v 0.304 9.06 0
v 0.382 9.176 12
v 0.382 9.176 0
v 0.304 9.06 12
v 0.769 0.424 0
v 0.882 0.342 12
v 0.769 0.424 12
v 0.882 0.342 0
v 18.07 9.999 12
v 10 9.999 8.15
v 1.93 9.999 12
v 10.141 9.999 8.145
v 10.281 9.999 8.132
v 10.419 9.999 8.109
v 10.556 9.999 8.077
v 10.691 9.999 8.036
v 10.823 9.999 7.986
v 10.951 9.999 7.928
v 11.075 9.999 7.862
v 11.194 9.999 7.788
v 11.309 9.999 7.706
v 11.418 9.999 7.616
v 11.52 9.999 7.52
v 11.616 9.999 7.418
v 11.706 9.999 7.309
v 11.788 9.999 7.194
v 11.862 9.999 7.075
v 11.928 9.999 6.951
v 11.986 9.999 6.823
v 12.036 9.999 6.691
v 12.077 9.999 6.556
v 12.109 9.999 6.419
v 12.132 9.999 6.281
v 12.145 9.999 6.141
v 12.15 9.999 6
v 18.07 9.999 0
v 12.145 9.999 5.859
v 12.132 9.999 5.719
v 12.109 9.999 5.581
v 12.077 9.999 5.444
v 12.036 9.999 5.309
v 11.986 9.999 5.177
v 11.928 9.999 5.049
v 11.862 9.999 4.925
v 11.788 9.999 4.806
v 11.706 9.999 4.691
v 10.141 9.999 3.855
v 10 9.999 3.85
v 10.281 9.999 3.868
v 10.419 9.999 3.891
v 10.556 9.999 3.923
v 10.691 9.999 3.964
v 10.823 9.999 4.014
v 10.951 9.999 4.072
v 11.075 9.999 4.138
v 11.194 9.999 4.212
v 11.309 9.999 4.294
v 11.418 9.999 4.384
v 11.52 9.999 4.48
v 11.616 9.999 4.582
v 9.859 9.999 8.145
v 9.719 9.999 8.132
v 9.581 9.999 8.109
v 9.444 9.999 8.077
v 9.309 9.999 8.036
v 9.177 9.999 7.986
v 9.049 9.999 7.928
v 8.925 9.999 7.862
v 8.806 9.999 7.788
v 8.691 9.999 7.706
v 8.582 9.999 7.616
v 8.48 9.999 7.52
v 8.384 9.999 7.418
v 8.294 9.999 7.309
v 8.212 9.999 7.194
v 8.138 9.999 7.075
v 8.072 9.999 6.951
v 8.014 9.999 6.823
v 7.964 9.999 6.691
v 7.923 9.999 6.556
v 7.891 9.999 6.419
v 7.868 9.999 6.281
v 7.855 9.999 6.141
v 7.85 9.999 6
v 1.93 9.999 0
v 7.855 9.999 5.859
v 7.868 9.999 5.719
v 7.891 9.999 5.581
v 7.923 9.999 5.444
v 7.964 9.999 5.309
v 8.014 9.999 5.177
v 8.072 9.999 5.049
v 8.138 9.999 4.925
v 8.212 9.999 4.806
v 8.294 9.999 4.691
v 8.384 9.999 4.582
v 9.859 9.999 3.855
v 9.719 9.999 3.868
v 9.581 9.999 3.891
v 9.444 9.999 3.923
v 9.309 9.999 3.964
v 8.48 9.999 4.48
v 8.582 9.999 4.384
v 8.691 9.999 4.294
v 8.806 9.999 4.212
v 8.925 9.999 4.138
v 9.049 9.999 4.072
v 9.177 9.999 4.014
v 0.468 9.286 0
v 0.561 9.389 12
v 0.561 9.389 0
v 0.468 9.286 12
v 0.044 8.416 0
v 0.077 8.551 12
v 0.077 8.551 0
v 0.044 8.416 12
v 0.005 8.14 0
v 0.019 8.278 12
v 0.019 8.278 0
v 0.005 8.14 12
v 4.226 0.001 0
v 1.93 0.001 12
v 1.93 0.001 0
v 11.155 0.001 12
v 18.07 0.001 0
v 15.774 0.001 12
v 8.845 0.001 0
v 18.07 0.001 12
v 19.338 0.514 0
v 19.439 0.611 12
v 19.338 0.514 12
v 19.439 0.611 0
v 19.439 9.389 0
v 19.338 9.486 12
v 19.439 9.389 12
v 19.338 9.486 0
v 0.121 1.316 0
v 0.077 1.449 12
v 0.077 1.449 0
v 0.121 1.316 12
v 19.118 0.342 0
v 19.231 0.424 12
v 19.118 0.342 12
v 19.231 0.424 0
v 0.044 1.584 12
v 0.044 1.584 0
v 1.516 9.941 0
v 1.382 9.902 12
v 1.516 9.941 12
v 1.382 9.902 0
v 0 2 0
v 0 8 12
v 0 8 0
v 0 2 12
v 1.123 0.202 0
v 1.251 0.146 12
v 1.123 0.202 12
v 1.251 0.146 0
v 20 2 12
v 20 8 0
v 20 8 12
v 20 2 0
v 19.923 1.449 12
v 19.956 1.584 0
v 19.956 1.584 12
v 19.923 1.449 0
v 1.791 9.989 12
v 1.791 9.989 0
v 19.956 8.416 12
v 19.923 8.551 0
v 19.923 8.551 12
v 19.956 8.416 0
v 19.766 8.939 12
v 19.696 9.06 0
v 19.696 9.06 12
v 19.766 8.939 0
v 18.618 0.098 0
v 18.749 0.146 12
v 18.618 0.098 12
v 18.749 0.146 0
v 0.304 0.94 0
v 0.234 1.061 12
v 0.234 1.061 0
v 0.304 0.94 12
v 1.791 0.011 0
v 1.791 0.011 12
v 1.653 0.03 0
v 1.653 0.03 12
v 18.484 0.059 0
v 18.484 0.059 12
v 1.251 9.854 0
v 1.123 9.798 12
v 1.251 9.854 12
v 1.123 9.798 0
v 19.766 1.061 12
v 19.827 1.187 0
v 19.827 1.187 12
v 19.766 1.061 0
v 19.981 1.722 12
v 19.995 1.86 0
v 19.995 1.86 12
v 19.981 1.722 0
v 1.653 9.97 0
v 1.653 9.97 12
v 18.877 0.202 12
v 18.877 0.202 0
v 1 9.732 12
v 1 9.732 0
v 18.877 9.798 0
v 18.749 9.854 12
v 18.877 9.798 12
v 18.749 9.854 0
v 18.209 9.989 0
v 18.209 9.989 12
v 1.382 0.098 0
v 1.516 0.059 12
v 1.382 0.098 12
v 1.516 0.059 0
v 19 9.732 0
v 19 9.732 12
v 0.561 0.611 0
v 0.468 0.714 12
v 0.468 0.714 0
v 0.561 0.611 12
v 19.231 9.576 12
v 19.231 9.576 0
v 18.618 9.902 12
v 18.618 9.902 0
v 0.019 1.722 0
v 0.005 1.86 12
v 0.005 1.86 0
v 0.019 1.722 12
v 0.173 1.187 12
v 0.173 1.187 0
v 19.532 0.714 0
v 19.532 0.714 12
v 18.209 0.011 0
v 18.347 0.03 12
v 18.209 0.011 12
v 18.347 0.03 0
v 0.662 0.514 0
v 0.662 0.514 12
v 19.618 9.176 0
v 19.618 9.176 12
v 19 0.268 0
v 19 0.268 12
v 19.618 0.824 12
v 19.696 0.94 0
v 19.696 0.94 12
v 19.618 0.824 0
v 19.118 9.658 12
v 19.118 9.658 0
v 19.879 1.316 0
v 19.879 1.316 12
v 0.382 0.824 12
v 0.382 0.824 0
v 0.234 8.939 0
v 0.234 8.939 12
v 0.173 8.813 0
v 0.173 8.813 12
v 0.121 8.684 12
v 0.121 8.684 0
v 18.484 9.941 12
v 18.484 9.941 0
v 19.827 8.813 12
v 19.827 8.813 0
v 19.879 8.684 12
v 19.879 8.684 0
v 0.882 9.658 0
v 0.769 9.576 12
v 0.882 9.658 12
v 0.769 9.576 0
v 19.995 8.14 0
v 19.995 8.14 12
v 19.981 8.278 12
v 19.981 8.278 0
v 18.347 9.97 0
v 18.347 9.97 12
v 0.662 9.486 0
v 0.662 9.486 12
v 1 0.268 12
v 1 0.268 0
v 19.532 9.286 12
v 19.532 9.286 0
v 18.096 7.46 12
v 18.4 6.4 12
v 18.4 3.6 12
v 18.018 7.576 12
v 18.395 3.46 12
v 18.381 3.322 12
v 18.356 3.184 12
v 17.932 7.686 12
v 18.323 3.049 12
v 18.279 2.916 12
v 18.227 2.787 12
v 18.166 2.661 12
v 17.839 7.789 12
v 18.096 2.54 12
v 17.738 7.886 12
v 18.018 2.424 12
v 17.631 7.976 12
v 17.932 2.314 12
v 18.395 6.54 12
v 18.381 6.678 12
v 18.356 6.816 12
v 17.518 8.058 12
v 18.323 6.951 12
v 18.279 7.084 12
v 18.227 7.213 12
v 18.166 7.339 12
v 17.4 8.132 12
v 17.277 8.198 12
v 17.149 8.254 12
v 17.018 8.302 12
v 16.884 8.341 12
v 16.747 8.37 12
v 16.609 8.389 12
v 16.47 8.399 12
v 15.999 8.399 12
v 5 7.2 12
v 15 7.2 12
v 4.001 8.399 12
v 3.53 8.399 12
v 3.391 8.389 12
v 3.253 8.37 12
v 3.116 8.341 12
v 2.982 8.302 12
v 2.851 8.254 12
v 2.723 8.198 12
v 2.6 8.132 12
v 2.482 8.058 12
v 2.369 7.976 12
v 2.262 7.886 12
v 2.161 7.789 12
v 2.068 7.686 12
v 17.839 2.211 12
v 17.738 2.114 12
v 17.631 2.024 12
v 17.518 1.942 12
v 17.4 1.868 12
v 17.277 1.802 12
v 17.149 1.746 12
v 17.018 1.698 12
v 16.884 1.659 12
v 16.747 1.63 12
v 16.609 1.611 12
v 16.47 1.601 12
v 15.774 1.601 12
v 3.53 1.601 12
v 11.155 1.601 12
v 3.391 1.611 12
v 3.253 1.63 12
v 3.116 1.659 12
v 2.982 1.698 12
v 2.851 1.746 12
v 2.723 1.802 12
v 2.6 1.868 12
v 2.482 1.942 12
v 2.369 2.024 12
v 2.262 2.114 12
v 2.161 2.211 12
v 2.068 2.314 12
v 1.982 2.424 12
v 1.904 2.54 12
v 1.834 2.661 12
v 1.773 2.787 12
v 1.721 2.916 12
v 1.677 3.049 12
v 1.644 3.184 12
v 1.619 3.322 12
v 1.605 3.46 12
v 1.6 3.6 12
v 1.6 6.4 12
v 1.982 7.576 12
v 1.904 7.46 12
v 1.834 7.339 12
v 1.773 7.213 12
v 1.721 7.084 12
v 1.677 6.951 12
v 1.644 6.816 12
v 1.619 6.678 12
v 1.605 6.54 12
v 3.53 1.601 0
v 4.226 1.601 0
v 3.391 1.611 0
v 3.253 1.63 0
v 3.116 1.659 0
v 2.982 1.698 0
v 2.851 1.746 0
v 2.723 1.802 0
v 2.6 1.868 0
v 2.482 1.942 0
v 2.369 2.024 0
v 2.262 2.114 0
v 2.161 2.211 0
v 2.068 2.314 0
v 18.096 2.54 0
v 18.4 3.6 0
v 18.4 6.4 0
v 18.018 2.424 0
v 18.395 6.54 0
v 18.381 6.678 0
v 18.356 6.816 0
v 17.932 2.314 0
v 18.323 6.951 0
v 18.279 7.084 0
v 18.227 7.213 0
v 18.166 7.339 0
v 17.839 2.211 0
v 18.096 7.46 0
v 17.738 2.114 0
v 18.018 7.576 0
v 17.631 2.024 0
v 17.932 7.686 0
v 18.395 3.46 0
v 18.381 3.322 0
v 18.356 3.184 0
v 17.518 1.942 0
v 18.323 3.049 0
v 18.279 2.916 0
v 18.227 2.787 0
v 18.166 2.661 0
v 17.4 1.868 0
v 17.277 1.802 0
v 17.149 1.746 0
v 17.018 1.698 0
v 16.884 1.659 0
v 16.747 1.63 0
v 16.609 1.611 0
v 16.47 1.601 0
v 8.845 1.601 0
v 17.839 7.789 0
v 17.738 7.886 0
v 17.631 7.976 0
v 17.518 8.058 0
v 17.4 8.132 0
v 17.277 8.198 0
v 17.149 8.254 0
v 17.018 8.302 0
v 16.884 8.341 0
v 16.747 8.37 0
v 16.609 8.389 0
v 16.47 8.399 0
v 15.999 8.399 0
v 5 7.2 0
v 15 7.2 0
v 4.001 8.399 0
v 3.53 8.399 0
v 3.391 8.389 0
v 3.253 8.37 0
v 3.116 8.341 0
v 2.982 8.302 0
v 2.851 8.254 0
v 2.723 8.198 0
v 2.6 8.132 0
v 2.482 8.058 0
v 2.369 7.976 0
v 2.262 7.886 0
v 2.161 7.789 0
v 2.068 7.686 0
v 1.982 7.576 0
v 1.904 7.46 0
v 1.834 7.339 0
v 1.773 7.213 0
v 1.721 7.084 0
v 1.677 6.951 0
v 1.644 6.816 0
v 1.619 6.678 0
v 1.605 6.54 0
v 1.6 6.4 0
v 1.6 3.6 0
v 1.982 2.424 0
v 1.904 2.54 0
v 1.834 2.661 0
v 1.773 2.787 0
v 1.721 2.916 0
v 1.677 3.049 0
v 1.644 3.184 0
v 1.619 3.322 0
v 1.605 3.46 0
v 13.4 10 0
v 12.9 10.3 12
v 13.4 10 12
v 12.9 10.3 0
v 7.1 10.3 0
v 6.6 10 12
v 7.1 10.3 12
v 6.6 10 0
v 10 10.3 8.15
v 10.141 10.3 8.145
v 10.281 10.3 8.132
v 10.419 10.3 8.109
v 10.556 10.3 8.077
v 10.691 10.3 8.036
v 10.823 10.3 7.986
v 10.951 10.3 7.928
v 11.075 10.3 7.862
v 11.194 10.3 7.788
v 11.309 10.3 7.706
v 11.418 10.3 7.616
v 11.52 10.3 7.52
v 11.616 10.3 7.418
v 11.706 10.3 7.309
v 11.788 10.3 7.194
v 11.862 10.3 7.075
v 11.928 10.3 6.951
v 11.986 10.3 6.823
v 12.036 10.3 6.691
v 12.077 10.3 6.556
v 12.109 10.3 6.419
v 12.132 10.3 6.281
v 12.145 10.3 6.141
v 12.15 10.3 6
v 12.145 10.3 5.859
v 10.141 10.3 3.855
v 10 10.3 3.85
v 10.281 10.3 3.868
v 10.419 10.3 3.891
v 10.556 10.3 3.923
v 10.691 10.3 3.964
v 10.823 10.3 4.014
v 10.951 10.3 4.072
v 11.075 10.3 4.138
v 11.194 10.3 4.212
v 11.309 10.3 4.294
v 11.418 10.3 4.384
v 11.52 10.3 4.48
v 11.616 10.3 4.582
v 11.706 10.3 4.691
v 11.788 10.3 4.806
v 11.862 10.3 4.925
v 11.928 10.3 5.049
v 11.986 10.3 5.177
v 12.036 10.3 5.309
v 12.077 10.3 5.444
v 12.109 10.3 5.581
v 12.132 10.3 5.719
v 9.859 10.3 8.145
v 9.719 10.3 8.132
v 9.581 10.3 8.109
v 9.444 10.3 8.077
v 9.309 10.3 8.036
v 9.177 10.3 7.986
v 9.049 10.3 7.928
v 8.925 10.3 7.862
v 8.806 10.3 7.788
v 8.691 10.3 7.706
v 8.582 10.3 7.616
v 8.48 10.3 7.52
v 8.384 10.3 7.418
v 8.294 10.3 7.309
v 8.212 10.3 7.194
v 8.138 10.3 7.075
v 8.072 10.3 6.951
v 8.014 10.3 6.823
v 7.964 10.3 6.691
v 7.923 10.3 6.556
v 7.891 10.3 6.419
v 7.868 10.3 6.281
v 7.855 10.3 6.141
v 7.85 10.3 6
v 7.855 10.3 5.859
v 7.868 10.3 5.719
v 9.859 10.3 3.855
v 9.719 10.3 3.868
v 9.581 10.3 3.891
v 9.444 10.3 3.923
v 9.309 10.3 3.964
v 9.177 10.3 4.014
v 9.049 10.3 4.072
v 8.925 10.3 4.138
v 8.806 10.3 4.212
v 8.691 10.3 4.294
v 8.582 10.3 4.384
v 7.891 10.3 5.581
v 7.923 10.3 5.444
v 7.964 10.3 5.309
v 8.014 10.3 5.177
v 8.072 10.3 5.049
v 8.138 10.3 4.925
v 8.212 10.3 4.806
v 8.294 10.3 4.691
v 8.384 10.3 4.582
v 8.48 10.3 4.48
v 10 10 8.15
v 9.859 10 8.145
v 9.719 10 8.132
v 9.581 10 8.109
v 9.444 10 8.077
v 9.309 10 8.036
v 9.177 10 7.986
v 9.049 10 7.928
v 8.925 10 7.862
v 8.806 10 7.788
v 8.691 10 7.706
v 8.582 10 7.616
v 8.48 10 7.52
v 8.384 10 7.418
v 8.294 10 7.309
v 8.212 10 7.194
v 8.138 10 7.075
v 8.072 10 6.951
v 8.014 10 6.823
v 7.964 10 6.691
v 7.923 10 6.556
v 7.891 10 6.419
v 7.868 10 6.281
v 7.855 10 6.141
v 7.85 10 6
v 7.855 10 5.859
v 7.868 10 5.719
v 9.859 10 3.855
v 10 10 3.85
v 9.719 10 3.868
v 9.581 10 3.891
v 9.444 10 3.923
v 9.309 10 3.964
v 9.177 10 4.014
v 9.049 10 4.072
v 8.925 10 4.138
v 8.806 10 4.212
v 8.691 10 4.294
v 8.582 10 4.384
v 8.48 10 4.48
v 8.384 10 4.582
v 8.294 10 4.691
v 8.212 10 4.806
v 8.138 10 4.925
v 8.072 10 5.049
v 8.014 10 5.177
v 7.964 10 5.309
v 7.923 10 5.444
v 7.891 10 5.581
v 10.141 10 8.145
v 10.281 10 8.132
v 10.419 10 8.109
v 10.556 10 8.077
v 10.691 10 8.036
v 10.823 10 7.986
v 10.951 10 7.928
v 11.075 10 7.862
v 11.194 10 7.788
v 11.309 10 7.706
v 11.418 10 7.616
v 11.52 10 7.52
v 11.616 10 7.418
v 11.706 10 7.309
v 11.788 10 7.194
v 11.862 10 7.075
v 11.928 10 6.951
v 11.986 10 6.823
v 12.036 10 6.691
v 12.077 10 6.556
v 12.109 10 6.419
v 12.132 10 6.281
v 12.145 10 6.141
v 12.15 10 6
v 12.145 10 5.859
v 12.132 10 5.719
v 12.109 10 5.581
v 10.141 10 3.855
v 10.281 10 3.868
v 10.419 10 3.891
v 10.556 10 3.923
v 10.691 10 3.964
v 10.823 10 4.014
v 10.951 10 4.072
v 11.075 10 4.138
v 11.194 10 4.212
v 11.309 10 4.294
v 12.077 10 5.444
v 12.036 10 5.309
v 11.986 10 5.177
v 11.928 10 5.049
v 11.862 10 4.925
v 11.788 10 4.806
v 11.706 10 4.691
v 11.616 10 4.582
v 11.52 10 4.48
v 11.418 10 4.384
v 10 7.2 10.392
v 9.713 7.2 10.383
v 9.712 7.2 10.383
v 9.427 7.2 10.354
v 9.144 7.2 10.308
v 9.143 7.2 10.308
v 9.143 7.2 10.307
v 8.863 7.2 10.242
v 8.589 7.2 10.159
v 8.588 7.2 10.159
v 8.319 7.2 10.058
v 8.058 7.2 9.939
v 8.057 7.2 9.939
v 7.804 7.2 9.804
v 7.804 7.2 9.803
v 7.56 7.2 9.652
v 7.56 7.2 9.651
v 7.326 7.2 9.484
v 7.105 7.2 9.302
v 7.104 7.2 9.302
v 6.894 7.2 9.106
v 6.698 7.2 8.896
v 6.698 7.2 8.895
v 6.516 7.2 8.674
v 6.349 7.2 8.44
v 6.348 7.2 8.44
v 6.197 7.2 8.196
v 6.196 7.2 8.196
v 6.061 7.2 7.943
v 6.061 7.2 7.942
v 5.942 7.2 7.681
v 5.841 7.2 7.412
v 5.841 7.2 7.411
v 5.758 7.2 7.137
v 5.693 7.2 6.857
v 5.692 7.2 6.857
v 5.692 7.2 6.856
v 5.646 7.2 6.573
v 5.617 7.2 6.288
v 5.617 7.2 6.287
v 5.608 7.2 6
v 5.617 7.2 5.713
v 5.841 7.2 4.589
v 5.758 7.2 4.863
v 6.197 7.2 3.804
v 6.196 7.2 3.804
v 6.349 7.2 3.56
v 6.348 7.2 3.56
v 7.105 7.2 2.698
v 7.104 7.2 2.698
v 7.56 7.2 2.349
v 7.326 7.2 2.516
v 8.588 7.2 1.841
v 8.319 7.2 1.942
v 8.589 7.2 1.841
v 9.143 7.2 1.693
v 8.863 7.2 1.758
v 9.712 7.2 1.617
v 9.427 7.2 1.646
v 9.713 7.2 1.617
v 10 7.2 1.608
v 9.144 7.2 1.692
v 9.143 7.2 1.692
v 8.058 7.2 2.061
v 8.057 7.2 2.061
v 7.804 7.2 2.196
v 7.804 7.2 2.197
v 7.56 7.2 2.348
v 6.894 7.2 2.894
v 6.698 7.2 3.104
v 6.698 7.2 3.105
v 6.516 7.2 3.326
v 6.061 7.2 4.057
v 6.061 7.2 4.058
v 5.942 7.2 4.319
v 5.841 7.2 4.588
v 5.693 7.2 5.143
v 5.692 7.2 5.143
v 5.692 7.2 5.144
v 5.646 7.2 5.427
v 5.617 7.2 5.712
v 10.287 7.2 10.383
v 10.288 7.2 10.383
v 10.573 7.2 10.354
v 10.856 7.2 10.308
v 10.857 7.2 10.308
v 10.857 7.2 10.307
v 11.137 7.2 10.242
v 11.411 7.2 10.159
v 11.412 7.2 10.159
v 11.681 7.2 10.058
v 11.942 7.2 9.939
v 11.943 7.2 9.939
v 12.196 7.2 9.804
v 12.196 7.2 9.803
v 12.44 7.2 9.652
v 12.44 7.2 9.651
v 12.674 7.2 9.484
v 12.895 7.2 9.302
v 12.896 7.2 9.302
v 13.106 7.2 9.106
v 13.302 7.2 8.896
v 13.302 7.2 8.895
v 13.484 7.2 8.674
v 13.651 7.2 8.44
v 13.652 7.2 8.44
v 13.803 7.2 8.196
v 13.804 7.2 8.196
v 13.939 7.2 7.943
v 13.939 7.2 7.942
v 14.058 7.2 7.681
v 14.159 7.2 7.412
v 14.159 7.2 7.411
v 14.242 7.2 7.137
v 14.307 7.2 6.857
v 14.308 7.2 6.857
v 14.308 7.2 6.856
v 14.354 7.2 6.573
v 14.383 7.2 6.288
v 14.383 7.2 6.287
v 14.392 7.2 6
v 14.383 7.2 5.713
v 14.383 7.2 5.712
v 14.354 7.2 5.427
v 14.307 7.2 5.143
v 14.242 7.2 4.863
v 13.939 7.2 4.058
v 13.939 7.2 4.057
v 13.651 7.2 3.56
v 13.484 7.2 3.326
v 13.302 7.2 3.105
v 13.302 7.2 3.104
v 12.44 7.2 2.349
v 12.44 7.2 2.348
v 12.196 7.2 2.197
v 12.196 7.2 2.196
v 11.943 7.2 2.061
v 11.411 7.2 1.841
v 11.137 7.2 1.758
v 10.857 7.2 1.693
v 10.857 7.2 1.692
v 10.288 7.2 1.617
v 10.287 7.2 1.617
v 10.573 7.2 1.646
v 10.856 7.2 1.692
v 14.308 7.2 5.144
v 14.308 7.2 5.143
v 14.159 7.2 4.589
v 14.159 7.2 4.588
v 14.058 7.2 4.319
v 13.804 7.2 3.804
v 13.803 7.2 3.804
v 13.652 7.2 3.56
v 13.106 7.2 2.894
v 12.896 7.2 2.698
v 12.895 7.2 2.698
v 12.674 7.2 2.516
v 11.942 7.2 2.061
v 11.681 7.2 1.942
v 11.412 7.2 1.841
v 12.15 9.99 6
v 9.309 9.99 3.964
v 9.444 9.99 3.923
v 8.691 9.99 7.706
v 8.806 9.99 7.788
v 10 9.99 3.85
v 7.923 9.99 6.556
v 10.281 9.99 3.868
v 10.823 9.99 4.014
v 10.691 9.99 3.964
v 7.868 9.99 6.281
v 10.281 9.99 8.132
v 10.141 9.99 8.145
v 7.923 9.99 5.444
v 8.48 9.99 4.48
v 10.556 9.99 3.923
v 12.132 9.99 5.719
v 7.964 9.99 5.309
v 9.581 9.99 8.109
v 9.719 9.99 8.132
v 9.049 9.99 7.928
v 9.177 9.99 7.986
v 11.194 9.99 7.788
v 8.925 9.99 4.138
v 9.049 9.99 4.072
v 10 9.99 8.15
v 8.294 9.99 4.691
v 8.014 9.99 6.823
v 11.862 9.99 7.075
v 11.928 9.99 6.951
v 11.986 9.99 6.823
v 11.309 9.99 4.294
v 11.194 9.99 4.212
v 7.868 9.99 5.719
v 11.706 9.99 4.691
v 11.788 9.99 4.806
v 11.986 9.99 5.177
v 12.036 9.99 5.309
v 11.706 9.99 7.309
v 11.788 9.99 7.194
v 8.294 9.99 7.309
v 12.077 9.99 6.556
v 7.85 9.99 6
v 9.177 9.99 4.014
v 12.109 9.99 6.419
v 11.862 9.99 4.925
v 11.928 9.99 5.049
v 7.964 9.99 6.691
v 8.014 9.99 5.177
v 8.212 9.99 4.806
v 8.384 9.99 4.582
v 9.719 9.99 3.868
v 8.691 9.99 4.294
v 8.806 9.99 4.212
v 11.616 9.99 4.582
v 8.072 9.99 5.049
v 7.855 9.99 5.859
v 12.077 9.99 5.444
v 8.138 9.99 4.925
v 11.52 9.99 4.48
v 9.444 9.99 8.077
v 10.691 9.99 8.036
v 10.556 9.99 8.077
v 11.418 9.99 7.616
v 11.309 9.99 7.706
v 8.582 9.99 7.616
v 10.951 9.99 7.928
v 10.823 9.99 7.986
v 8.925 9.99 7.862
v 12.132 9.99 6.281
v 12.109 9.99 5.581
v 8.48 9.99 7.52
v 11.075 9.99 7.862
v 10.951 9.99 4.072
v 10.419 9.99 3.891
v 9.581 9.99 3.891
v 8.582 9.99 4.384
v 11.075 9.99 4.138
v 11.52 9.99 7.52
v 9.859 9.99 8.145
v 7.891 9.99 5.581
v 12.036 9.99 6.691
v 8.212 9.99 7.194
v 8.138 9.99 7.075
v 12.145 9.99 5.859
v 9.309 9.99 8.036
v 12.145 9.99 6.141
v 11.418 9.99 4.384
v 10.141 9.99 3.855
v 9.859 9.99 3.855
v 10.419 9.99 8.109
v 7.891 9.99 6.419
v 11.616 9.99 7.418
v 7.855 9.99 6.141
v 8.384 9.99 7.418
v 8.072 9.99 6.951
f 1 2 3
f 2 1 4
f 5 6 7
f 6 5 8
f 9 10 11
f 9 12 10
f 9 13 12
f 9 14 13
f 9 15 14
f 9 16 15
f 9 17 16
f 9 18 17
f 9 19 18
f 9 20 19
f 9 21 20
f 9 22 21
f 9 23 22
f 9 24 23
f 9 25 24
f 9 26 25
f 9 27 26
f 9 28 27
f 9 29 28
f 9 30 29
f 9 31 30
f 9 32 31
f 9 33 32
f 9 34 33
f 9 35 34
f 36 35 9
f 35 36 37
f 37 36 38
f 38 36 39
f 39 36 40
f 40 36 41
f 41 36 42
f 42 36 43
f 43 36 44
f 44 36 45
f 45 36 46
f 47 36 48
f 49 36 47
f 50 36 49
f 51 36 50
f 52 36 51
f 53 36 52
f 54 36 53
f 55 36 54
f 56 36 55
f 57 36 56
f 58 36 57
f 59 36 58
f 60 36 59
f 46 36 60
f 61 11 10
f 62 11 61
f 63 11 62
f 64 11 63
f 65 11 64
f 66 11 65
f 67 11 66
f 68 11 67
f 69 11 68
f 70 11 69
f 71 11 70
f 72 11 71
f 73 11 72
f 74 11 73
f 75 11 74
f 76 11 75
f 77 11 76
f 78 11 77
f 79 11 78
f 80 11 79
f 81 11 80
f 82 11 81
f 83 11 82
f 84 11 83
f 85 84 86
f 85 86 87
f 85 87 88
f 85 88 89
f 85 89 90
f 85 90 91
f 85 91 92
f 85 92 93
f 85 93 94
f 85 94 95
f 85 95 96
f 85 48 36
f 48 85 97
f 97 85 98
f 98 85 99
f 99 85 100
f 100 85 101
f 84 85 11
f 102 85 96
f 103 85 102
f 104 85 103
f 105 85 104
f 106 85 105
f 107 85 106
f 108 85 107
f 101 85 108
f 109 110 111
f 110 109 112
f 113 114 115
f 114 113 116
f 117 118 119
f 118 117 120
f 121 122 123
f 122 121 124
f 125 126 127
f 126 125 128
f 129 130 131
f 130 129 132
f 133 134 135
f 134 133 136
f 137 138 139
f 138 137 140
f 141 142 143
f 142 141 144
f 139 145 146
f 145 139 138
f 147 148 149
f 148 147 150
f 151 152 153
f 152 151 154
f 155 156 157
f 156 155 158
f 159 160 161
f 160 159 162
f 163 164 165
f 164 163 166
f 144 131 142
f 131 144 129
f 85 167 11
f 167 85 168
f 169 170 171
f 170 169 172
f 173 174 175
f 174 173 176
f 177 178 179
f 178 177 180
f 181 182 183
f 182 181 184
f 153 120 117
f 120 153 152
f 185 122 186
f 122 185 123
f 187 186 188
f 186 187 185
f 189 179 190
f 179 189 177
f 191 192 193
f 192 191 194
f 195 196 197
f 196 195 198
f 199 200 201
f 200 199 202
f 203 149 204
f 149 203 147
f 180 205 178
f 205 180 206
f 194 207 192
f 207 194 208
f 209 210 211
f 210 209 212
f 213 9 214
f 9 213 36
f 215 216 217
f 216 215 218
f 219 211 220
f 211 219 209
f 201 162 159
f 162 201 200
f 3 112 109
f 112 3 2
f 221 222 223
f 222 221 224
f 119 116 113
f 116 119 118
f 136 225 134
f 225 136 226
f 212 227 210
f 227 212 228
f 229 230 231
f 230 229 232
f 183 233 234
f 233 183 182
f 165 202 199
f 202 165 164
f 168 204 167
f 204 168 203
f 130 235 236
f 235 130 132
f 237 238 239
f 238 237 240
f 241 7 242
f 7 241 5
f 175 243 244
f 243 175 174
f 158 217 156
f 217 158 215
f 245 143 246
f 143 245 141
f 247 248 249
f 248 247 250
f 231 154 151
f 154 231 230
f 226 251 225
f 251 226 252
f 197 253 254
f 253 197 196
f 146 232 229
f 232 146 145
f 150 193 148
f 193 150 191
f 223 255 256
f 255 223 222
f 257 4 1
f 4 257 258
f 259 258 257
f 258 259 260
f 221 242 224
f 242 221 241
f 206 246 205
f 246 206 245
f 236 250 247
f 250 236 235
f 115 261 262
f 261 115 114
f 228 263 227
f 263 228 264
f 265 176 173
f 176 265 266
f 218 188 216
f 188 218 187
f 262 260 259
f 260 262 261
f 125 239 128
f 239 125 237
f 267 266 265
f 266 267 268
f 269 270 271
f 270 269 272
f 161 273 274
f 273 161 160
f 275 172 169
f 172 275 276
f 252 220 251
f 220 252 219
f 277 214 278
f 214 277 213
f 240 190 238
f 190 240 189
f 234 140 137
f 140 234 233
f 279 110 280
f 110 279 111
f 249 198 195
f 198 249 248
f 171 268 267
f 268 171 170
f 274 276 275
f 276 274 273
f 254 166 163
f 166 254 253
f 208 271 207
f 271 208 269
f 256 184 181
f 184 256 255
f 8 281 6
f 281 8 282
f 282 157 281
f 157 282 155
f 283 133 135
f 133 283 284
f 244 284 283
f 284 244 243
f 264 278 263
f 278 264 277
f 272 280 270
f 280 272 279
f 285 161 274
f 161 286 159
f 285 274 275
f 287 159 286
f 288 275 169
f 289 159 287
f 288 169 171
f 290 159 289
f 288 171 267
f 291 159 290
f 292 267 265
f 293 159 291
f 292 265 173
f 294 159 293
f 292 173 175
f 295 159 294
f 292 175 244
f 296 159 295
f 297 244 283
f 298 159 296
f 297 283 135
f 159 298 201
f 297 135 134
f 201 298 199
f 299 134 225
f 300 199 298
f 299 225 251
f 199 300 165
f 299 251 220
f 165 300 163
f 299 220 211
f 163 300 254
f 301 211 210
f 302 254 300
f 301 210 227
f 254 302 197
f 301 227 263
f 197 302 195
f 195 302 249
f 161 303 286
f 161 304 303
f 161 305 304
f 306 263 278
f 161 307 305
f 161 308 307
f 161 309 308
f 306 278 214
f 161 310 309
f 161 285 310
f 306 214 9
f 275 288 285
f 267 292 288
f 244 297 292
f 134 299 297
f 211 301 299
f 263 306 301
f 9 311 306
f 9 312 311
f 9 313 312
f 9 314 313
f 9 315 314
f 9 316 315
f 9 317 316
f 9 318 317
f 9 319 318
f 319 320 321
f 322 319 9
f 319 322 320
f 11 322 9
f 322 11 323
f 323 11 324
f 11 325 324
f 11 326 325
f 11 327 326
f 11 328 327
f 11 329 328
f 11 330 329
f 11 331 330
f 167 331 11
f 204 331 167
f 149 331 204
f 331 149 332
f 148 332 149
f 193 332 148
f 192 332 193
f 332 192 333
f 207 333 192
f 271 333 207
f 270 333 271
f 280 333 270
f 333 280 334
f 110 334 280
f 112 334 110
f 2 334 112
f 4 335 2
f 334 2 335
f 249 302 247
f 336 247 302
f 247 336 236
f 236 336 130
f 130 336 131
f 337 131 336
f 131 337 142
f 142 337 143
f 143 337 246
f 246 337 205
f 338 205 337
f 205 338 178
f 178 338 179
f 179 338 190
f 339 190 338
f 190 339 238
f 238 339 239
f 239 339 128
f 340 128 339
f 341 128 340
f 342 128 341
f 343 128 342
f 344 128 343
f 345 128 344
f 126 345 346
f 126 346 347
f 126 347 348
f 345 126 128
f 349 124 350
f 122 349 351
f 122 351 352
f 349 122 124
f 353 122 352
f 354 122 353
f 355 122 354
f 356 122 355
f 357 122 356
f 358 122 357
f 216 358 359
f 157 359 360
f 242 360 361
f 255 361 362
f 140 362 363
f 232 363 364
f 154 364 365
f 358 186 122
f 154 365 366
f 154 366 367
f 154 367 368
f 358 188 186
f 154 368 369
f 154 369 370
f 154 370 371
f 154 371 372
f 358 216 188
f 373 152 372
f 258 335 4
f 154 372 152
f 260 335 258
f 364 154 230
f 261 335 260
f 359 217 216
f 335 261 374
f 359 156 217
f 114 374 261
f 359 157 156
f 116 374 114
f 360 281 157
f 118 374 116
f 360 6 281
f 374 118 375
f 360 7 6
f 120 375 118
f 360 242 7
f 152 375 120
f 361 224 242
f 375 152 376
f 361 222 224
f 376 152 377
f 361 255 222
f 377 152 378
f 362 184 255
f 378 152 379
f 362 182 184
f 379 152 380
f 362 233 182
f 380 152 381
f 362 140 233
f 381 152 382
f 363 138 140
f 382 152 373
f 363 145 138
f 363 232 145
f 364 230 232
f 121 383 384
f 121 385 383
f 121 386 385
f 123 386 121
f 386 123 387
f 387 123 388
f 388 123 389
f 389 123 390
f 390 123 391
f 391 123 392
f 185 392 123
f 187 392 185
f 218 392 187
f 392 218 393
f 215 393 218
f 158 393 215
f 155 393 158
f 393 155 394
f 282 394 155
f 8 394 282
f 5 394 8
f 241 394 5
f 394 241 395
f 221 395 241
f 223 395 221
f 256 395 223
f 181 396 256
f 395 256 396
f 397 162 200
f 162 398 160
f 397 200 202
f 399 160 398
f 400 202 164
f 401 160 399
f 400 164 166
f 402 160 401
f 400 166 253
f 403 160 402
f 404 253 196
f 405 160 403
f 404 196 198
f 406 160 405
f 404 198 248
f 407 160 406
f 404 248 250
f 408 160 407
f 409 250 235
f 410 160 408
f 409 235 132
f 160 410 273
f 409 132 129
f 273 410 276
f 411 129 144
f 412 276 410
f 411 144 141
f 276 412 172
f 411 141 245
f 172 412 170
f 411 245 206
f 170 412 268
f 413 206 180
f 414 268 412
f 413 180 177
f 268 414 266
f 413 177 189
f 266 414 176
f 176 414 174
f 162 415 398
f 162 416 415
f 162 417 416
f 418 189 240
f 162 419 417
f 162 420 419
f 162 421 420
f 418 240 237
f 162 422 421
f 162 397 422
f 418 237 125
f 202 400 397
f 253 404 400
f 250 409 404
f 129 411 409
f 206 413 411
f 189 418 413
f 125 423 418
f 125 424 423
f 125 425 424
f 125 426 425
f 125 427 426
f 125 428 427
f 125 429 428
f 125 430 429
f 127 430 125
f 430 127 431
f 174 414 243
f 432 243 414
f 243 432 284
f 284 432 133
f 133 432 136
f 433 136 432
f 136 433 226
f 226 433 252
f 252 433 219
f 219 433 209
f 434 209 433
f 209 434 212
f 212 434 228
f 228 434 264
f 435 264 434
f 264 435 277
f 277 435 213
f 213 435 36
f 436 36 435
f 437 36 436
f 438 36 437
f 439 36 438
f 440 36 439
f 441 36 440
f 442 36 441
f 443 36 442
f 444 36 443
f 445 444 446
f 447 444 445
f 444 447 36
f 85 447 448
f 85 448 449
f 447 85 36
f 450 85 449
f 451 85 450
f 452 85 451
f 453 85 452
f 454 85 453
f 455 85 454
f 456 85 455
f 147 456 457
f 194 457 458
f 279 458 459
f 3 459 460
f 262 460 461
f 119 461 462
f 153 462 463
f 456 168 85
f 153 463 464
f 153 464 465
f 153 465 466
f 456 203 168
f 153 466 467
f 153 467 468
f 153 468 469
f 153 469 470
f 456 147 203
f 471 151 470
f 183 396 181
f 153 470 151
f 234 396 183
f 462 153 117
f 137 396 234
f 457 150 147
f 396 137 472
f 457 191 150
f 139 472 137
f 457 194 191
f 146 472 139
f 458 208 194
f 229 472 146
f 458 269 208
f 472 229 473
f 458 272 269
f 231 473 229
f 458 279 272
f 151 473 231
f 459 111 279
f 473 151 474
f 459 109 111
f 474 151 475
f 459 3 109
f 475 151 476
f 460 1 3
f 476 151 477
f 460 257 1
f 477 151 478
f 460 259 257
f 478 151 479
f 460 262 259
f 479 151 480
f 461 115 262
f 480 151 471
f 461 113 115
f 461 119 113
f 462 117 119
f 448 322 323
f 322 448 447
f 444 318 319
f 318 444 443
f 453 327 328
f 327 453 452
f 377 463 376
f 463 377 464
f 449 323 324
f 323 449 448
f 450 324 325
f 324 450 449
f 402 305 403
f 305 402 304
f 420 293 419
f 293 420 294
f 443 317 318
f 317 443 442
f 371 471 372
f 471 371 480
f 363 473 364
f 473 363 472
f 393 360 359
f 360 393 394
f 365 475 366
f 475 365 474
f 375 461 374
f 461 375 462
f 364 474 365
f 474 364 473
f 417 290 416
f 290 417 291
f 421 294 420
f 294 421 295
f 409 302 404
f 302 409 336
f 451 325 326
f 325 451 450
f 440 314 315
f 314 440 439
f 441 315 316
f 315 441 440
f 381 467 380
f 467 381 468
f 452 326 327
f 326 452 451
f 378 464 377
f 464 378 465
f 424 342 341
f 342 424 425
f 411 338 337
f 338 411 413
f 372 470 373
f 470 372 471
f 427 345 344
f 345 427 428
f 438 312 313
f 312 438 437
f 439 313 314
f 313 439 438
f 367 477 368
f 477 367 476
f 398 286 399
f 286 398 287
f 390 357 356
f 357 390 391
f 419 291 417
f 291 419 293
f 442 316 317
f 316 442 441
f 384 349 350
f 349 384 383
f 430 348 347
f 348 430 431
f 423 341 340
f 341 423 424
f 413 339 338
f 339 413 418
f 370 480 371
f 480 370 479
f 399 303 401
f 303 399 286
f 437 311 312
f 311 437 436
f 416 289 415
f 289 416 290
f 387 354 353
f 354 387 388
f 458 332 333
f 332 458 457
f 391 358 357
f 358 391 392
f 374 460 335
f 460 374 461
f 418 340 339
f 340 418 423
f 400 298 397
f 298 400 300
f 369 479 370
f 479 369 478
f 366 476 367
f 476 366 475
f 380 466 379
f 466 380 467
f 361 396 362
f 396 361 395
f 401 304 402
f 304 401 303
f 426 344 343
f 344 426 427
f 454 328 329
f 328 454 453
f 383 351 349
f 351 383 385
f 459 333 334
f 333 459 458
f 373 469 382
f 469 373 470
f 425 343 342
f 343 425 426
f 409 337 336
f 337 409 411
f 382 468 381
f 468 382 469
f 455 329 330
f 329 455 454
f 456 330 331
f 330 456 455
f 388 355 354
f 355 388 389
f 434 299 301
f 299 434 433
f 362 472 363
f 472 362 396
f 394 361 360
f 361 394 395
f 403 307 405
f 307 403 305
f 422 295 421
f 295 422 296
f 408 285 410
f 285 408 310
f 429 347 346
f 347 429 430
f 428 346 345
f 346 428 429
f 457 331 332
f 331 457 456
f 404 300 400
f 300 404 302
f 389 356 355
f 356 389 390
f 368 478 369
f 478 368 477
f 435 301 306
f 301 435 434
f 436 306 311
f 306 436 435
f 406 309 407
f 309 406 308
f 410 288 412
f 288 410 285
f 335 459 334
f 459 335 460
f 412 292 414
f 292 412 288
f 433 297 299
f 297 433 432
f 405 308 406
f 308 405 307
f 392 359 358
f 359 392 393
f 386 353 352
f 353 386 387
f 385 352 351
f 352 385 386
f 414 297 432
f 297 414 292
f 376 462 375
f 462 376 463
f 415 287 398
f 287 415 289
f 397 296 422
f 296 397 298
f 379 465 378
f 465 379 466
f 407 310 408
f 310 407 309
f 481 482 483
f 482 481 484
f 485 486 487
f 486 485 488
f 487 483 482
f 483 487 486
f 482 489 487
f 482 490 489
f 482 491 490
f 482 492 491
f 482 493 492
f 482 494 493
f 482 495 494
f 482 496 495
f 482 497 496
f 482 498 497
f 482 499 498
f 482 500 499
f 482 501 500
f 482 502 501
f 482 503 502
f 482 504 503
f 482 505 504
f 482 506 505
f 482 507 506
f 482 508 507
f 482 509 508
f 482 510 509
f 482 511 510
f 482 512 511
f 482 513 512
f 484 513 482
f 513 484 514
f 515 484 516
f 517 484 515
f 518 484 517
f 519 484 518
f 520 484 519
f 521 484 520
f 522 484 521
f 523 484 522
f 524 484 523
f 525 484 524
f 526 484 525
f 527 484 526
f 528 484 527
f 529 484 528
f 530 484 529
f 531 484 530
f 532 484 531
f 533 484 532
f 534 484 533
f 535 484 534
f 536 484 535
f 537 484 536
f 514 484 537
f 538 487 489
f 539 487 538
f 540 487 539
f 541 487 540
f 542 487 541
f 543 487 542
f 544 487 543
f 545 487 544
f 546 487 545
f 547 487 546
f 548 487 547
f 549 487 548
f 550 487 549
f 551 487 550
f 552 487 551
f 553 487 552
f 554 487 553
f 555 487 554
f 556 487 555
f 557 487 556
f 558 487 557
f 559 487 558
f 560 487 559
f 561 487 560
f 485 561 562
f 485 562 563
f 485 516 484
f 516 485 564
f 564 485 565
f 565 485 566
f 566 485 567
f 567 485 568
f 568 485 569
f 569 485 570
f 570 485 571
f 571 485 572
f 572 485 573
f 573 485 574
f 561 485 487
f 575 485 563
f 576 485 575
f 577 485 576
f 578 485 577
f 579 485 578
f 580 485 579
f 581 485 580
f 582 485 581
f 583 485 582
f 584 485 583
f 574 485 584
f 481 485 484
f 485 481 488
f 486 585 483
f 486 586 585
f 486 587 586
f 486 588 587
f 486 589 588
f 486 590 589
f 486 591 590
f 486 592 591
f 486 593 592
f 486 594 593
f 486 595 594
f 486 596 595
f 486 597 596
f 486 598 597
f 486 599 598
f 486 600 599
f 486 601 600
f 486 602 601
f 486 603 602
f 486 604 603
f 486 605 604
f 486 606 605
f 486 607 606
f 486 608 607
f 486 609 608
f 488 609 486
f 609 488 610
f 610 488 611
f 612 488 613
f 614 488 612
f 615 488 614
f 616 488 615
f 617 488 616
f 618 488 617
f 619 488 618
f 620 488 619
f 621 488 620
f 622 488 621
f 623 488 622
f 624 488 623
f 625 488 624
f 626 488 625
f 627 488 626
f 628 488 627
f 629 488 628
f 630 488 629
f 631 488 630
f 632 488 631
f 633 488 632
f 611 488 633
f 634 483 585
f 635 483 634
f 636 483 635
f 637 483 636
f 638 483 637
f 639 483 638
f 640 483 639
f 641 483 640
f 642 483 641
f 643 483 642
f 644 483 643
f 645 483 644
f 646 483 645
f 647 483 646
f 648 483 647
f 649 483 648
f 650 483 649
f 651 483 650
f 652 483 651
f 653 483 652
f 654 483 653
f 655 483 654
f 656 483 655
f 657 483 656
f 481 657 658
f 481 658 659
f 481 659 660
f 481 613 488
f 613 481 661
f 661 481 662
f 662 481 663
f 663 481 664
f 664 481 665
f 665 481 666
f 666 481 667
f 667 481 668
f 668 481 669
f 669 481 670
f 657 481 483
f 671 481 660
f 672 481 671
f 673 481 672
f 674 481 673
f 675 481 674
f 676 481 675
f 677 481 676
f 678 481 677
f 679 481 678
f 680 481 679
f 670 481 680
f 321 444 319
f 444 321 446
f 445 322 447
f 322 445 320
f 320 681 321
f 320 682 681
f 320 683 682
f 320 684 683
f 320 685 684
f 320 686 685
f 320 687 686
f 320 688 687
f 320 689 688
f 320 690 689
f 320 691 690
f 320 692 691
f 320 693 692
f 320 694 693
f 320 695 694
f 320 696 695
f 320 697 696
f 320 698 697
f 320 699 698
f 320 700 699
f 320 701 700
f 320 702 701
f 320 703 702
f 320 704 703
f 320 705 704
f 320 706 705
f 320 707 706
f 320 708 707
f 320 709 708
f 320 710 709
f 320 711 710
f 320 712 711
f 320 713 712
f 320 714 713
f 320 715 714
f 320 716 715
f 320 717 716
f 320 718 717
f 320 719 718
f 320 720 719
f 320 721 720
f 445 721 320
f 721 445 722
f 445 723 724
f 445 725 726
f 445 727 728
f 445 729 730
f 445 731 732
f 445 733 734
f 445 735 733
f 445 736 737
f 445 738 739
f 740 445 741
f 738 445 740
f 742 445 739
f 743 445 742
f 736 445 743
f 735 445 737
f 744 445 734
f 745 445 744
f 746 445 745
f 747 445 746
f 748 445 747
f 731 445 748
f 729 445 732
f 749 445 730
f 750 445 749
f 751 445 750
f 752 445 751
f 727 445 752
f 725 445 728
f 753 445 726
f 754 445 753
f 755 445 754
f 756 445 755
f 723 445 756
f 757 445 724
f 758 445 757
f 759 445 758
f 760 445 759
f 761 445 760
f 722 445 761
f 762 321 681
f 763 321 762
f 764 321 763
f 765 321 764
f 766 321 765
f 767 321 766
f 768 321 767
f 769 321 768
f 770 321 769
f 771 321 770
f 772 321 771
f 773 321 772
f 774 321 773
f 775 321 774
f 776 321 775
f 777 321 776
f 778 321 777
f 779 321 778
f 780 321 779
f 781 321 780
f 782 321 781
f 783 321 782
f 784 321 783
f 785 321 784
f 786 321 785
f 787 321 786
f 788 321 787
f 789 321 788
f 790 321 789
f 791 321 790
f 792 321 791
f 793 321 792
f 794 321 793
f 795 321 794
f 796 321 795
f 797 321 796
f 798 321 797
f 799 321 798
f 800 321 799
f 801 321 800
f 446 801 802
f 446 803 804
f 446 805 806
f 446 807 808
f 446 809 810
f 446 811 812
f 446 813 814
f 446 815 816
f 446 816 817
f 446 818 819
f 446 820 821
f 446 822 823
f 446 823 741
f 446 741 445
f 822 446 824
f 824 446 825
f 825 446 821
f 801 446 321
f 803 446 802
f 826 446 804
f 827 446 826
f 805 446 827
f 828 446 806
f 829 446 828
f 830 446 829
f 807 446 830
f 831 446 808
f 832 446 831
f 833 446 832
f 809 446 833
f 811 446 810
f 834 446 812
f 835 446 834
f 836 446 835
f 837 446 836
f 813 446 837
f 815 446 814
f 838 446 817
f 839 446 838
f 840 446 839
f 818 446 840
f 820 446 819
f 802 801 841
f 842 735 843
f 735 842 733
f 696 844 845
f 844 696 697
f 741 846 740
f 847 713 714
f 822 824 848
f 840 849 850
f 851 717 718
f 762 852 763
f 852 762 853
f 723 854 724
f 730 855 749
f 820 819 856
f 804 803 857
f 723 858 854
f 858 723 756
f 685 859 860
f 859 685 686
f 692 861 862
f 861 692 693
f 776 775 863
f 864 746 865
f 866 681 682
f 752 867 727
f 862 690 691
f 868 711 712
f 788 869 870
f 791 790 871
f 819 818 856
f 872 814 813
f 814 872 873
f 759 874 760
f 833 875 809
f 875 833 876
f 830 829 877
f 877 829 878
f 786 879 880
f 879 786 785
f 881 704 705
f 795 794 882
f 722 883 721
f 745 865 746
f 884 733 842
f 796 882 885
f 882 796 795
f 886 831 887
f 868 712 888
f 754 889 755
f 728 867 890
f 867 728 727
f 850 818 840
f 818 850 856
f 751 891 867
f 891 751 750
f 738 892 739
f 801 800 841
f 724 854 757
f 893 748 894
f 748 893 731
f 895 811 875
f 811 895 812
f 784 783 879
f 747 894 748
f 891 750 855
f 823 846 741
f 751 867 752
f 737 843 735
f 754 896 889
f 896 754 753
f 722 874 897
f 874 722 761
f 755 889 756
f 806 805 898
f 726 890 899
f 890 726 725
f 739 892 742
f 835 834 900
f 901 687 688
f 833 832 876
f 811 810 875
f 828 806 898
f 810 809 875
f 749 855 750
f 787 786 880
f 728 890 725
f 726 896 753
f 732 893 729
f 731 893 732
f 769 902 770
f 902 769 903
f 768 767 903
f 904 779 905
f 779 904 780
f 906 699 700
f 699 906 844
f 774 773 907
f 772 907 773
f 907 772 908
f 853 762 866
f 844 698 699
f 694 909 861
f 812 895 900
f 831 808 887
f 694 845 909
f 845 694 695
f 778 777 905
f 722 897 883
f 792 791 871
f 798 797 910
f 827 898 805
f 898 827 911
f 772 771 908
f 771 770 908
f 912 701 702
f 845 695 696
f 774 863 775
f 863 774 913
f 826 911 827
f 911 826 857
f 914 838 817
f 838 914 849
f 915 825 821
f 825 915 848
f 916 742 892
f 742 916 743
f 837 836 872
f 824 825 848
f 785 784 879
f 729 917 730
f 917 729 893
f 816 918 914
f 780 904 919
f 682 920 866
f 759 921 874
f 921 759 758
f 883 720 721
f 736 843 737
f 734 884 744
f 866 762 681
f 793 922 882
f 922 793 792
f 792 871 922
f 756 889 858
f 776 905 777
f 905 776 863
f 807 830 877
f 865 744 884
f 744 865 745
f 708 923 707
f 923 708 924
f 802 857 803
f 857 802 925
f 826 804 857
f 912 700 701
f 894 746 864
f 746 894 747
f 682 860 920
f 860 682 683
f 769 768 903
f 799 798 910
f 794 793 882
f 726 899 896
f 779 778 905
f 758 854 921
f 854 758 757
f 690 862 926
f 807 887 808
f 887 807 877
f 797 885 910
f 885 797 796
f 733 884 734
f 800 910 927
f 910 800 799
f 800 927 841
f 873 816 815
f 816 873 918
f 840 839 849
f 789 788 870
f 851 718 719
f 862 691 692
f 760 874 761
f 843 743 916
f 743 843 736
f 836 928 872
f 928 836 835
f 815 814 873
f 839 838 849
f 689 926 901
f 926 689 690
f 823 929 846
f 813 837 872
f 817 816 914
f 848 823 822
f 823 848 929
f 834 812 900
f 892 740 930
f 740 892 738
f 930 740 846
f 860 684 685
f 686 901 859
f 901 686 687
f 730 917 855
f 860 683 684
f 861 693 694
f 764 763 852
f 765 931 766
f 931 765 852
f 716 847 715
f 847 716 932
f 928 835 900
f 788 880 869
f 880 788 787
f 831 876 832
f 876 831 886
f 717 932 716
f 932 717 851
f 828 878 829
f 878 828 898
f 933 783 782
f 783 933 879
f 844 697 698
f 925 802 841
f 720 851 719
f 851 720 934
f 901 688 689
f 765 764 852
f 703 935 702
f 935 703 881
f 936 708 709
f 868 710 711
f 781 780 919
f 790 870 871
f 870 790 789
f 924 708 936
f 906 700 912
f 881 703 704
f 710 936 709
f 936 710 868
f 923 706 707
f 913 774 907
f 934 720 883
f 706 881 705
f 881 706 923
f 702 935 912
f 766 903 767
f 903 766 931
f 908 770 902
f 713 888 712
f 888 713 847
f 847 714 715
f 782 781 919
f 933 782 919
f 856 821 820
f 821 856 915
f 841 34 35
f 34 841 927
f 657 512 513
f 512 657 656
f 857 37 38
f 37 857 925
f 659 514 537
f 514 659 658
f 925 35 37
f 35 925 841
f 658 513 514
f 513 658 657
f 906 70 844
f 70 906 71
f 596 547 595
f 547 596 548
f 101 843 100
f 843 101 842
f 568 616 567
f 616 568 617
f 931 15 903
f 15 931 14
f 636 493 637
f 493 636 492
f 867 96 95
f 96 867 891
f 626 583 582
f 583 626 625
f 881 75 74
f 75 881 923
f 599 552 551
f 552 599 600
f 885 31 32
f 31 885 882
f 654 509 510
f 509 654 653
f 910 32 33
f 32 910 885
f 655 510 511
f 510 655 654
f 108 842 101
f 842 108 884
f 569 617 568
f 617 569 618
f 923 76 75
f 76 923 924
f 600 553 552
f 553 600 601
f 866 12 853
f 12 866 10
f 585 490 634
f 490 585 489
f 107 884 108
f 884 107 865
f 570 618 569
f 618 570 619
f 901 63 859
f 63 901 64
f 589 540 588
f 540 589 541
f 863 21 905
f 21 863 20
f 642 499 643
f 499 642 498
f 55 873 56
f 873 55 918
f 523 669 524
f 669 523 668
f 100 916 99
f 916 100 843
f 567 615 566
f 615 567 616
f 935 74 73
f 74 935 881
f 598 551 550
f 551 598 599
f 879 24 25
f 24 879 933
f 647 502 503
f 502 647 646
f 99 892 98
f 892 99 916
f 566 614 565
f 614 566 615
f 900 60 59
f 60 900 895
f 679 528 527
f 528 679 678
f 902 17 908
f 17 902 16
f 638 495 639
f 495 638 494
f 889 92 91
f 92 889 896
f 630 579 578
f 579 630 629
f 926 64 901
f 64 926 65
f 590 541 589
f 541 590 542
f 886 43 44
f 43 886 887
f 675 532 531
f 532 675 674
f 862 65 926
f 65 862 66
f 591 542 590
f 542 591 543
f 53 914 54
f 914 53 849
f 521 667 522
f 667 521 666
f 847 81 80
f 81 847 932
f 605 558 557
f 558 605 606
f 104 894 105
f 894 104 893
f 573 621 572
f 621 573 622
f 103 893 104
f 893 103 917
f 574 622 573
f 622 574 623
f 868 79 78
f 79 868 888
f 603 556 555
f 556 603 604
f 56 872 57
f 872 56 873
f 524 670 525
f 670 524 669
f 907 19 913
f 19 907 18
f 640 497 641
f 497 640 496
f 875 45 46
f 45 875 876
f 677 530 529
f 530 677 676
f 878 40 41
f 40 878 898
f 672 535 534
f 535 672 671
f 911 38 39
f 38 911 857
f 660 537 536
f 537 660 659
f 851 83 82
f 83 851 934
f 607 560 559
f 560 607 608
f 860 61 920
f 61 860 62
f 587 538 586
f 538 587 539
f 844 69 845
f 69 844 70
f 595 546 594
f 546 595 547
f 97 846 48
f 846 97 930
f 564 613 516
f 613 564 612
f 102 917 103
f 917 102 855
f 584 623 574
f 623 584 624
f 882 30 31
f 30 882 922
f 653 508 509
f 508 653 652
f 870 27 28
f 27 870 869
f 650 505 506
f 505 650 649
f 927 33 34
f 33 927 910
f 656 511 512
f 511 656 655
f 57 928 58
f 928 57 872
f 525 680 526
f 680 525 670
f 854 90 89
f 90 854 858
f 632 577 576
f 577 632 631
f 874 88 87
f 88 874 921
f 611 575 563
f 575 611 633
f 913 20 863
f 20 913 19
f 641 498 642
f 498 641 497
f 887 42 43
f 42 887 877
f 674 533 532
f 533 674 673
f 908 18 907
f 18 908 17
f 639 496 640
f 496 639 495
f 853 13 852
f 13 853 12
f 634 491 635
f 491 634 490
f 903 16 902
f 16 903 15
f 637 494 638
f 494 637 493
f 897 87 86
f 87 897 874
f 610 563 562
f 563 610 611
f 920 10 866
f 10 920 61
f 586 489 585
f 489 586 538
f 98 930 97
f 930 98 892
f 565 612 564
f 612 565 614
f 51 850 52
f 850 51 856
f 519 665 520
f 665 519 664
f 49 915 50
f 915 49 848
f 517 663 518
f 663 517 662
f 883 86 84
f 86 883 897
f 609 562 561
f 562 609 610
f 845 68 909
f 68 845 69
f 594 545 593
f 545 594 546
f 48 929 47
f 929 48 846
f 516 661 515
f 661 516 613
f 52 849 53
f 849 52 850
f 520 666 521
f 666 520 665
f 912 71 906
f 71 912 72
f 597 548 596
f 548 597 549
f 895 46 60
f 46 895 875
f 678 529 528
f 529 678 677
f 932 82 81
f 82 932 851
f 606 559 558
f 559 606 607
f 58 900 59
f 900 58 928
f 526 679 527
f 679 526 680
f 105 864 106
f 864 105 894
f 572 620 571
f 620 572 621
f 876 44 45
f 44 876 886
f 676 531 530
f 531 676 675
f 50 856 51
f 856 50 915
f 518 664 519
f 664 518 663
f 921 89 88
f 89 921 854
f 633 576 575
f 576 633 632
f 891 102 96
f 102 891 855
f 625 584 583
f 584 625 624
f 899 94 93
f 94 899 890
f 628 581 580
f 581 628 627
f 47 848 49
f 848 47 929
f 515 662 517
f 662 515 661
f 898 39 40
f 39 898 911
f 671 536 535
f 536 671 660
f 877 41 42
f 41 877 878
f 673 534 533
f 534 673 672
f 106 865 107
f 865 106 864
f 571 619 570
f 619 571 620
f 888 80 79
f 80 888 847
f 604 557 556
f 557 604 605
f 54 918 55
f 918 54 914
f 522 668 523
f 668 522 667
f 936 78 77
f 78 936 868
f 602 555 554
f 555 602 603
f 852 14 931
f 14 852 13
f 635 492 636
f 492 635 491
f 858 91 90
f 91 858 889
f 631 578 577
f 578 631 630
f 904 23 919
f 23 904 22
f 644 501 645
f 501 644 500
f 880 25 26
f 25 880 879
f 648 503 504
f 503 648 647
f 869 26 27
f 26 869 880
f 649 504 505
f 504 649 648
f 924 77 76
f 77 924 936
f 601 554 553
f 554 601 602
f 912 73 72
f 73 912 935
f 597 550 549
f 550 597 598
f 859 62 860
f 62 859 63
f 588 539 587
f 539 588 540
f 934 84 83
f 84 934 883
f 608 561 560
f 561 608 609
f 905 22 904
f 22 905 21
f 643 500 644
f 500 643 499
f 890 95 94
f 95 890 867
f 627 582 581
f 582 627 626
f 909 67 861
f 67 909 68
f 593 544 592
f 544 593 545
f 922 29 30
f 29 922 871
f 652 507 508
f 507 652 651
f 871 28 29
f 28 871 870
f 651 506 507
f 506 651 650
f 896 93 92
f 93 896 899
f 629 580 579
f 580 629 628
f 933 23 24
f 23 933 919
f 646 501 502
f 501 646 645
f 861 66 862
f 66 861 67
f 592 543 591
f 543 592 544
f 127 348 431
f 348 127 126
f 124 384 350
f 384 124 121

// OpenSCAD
$fn=96;

/// Parameters

// Avoid artifacts
clearance = 0.01;

// Number of holes
holes = 1;

// Thickness of the wall
wall_width = 1.6;

// Corner radius
corner_radius = 2;

// With of the clip, Usually 20.
clip_width = 20;

// Depth of the clip, higher values givr more space in the clip
clip_depth = 10;

// Length of the clip
clip_length = 12;

// Slot with
slot_width = 4;

// Slot angle
slot_angle = 30;

// Countersunk screw large head diameter
screw_head_diameter = 8.8;

// Countersunk screw small head diameter
screw_head_height = 2.8;

// Mounting screw hole diameter
screw_hole_diameter = 4.3;

// Outer bulge width large
outer_bulge_width_1 = 6.8;

// Outer bulge width smaller
outer_bulge_width_2 = 5.8;

// Outer bulge length
outer_bulge_depth = 0.3;

// Inner bulge width large
inner_bulge_width_1 = 10;

// Inner bulge width large
inner_bulge_width_2 = 12;

// Inner bulge length
inner_bulge_depth = 1.2;

difference() {
    
    union() {
        holedRoundedRectangle(clip_width, clip_depth, clip_length, corner_radius);

        // Outer bulge
        translate([clip_width/2-outer_bulge_width_1/2,clip_depth,0]) {
            bulge(outer_bulge_width_1,outer_bulge_width_2,outer_bulge_depth,clip_length);
        }
        
        // Inner bulge
        translate([clip_width/2-inner_bulge_width_1/2,clip_depth-wall_width-inner_bulge_depth,0]) {
            bulge(inner_bulge_width_1,inner_bulge_width_2,inner_bulge_depth,clip_length);
        }
    }
    
    // Subtract slot
    translate([clip_width/2,wall_width/2+clearance,clip_length/2]) {
        rotate(slot_angle, [0,1,0]) {
            cube([slot_width, 2*wall_width+2*clearance,pow(clip_length,2)+2*clearance], center=true);
        }
    }
    
    // Screw hole
    step = clip_length / holes;
    for (n=[0:step:(holes-1)*step]) {
        translate([clip_width/2,clip_depth-wall_width-inner_bulge_depth-clearance,step/2+n]) {
            rotate(270, [1,0,0]) {
                // Screw head
                cylinder(d1=screw_head_diameter, d2=screw_hole_diameter, h=screw_head_height);
                // Screw hole
                cylinder(d=screw_hole_diameter, h=inner_bulge_depth+wall_width+2*clearance+outer_bulge_depth);
            }
        }
    }
}



///////////////
// Modules //
///////////////

module bulge(width1, width2, depth, height) {
    linear_extrude(height=height) {
        polygon([
            [0,0],
            [width1,0],
            [width2+(width1-width2)/2,depth],
            [(width1-width2)/2,depth]
        ]);
    }
}

module holedRoundedRectangle(width, depth, height, radius) {

    difference() {
        
        // Outer cube
        roundedRectangle(width, depth, height, radius);
        
        // Substract inner rectangle
        translate([wall_width,wall_width,-clearance]) {
            roundedRectangle(width-2*wall_width, depth-2*wall_width, height+2*clearance, radius);
        }
    }
}

module roundedRectangle(width, depth, height, radius) {
    hull () {    
        translate([radius,radius,0]) {
            cylinder(h=height, r=radius, $fn=90);
        }
        translate([width-radius,radius,0]) {
            cylinder(h=height, r=radius, $fn=90);
        }
        translate([radius,depth-radius,0]) {
            cylinder(h=height, r=radius, $fn=90);
        }
        translate([width-radius,depth-radius,0]) {
            cylinder(h=height, r=radius, $fn=90);
        }
    }
}
